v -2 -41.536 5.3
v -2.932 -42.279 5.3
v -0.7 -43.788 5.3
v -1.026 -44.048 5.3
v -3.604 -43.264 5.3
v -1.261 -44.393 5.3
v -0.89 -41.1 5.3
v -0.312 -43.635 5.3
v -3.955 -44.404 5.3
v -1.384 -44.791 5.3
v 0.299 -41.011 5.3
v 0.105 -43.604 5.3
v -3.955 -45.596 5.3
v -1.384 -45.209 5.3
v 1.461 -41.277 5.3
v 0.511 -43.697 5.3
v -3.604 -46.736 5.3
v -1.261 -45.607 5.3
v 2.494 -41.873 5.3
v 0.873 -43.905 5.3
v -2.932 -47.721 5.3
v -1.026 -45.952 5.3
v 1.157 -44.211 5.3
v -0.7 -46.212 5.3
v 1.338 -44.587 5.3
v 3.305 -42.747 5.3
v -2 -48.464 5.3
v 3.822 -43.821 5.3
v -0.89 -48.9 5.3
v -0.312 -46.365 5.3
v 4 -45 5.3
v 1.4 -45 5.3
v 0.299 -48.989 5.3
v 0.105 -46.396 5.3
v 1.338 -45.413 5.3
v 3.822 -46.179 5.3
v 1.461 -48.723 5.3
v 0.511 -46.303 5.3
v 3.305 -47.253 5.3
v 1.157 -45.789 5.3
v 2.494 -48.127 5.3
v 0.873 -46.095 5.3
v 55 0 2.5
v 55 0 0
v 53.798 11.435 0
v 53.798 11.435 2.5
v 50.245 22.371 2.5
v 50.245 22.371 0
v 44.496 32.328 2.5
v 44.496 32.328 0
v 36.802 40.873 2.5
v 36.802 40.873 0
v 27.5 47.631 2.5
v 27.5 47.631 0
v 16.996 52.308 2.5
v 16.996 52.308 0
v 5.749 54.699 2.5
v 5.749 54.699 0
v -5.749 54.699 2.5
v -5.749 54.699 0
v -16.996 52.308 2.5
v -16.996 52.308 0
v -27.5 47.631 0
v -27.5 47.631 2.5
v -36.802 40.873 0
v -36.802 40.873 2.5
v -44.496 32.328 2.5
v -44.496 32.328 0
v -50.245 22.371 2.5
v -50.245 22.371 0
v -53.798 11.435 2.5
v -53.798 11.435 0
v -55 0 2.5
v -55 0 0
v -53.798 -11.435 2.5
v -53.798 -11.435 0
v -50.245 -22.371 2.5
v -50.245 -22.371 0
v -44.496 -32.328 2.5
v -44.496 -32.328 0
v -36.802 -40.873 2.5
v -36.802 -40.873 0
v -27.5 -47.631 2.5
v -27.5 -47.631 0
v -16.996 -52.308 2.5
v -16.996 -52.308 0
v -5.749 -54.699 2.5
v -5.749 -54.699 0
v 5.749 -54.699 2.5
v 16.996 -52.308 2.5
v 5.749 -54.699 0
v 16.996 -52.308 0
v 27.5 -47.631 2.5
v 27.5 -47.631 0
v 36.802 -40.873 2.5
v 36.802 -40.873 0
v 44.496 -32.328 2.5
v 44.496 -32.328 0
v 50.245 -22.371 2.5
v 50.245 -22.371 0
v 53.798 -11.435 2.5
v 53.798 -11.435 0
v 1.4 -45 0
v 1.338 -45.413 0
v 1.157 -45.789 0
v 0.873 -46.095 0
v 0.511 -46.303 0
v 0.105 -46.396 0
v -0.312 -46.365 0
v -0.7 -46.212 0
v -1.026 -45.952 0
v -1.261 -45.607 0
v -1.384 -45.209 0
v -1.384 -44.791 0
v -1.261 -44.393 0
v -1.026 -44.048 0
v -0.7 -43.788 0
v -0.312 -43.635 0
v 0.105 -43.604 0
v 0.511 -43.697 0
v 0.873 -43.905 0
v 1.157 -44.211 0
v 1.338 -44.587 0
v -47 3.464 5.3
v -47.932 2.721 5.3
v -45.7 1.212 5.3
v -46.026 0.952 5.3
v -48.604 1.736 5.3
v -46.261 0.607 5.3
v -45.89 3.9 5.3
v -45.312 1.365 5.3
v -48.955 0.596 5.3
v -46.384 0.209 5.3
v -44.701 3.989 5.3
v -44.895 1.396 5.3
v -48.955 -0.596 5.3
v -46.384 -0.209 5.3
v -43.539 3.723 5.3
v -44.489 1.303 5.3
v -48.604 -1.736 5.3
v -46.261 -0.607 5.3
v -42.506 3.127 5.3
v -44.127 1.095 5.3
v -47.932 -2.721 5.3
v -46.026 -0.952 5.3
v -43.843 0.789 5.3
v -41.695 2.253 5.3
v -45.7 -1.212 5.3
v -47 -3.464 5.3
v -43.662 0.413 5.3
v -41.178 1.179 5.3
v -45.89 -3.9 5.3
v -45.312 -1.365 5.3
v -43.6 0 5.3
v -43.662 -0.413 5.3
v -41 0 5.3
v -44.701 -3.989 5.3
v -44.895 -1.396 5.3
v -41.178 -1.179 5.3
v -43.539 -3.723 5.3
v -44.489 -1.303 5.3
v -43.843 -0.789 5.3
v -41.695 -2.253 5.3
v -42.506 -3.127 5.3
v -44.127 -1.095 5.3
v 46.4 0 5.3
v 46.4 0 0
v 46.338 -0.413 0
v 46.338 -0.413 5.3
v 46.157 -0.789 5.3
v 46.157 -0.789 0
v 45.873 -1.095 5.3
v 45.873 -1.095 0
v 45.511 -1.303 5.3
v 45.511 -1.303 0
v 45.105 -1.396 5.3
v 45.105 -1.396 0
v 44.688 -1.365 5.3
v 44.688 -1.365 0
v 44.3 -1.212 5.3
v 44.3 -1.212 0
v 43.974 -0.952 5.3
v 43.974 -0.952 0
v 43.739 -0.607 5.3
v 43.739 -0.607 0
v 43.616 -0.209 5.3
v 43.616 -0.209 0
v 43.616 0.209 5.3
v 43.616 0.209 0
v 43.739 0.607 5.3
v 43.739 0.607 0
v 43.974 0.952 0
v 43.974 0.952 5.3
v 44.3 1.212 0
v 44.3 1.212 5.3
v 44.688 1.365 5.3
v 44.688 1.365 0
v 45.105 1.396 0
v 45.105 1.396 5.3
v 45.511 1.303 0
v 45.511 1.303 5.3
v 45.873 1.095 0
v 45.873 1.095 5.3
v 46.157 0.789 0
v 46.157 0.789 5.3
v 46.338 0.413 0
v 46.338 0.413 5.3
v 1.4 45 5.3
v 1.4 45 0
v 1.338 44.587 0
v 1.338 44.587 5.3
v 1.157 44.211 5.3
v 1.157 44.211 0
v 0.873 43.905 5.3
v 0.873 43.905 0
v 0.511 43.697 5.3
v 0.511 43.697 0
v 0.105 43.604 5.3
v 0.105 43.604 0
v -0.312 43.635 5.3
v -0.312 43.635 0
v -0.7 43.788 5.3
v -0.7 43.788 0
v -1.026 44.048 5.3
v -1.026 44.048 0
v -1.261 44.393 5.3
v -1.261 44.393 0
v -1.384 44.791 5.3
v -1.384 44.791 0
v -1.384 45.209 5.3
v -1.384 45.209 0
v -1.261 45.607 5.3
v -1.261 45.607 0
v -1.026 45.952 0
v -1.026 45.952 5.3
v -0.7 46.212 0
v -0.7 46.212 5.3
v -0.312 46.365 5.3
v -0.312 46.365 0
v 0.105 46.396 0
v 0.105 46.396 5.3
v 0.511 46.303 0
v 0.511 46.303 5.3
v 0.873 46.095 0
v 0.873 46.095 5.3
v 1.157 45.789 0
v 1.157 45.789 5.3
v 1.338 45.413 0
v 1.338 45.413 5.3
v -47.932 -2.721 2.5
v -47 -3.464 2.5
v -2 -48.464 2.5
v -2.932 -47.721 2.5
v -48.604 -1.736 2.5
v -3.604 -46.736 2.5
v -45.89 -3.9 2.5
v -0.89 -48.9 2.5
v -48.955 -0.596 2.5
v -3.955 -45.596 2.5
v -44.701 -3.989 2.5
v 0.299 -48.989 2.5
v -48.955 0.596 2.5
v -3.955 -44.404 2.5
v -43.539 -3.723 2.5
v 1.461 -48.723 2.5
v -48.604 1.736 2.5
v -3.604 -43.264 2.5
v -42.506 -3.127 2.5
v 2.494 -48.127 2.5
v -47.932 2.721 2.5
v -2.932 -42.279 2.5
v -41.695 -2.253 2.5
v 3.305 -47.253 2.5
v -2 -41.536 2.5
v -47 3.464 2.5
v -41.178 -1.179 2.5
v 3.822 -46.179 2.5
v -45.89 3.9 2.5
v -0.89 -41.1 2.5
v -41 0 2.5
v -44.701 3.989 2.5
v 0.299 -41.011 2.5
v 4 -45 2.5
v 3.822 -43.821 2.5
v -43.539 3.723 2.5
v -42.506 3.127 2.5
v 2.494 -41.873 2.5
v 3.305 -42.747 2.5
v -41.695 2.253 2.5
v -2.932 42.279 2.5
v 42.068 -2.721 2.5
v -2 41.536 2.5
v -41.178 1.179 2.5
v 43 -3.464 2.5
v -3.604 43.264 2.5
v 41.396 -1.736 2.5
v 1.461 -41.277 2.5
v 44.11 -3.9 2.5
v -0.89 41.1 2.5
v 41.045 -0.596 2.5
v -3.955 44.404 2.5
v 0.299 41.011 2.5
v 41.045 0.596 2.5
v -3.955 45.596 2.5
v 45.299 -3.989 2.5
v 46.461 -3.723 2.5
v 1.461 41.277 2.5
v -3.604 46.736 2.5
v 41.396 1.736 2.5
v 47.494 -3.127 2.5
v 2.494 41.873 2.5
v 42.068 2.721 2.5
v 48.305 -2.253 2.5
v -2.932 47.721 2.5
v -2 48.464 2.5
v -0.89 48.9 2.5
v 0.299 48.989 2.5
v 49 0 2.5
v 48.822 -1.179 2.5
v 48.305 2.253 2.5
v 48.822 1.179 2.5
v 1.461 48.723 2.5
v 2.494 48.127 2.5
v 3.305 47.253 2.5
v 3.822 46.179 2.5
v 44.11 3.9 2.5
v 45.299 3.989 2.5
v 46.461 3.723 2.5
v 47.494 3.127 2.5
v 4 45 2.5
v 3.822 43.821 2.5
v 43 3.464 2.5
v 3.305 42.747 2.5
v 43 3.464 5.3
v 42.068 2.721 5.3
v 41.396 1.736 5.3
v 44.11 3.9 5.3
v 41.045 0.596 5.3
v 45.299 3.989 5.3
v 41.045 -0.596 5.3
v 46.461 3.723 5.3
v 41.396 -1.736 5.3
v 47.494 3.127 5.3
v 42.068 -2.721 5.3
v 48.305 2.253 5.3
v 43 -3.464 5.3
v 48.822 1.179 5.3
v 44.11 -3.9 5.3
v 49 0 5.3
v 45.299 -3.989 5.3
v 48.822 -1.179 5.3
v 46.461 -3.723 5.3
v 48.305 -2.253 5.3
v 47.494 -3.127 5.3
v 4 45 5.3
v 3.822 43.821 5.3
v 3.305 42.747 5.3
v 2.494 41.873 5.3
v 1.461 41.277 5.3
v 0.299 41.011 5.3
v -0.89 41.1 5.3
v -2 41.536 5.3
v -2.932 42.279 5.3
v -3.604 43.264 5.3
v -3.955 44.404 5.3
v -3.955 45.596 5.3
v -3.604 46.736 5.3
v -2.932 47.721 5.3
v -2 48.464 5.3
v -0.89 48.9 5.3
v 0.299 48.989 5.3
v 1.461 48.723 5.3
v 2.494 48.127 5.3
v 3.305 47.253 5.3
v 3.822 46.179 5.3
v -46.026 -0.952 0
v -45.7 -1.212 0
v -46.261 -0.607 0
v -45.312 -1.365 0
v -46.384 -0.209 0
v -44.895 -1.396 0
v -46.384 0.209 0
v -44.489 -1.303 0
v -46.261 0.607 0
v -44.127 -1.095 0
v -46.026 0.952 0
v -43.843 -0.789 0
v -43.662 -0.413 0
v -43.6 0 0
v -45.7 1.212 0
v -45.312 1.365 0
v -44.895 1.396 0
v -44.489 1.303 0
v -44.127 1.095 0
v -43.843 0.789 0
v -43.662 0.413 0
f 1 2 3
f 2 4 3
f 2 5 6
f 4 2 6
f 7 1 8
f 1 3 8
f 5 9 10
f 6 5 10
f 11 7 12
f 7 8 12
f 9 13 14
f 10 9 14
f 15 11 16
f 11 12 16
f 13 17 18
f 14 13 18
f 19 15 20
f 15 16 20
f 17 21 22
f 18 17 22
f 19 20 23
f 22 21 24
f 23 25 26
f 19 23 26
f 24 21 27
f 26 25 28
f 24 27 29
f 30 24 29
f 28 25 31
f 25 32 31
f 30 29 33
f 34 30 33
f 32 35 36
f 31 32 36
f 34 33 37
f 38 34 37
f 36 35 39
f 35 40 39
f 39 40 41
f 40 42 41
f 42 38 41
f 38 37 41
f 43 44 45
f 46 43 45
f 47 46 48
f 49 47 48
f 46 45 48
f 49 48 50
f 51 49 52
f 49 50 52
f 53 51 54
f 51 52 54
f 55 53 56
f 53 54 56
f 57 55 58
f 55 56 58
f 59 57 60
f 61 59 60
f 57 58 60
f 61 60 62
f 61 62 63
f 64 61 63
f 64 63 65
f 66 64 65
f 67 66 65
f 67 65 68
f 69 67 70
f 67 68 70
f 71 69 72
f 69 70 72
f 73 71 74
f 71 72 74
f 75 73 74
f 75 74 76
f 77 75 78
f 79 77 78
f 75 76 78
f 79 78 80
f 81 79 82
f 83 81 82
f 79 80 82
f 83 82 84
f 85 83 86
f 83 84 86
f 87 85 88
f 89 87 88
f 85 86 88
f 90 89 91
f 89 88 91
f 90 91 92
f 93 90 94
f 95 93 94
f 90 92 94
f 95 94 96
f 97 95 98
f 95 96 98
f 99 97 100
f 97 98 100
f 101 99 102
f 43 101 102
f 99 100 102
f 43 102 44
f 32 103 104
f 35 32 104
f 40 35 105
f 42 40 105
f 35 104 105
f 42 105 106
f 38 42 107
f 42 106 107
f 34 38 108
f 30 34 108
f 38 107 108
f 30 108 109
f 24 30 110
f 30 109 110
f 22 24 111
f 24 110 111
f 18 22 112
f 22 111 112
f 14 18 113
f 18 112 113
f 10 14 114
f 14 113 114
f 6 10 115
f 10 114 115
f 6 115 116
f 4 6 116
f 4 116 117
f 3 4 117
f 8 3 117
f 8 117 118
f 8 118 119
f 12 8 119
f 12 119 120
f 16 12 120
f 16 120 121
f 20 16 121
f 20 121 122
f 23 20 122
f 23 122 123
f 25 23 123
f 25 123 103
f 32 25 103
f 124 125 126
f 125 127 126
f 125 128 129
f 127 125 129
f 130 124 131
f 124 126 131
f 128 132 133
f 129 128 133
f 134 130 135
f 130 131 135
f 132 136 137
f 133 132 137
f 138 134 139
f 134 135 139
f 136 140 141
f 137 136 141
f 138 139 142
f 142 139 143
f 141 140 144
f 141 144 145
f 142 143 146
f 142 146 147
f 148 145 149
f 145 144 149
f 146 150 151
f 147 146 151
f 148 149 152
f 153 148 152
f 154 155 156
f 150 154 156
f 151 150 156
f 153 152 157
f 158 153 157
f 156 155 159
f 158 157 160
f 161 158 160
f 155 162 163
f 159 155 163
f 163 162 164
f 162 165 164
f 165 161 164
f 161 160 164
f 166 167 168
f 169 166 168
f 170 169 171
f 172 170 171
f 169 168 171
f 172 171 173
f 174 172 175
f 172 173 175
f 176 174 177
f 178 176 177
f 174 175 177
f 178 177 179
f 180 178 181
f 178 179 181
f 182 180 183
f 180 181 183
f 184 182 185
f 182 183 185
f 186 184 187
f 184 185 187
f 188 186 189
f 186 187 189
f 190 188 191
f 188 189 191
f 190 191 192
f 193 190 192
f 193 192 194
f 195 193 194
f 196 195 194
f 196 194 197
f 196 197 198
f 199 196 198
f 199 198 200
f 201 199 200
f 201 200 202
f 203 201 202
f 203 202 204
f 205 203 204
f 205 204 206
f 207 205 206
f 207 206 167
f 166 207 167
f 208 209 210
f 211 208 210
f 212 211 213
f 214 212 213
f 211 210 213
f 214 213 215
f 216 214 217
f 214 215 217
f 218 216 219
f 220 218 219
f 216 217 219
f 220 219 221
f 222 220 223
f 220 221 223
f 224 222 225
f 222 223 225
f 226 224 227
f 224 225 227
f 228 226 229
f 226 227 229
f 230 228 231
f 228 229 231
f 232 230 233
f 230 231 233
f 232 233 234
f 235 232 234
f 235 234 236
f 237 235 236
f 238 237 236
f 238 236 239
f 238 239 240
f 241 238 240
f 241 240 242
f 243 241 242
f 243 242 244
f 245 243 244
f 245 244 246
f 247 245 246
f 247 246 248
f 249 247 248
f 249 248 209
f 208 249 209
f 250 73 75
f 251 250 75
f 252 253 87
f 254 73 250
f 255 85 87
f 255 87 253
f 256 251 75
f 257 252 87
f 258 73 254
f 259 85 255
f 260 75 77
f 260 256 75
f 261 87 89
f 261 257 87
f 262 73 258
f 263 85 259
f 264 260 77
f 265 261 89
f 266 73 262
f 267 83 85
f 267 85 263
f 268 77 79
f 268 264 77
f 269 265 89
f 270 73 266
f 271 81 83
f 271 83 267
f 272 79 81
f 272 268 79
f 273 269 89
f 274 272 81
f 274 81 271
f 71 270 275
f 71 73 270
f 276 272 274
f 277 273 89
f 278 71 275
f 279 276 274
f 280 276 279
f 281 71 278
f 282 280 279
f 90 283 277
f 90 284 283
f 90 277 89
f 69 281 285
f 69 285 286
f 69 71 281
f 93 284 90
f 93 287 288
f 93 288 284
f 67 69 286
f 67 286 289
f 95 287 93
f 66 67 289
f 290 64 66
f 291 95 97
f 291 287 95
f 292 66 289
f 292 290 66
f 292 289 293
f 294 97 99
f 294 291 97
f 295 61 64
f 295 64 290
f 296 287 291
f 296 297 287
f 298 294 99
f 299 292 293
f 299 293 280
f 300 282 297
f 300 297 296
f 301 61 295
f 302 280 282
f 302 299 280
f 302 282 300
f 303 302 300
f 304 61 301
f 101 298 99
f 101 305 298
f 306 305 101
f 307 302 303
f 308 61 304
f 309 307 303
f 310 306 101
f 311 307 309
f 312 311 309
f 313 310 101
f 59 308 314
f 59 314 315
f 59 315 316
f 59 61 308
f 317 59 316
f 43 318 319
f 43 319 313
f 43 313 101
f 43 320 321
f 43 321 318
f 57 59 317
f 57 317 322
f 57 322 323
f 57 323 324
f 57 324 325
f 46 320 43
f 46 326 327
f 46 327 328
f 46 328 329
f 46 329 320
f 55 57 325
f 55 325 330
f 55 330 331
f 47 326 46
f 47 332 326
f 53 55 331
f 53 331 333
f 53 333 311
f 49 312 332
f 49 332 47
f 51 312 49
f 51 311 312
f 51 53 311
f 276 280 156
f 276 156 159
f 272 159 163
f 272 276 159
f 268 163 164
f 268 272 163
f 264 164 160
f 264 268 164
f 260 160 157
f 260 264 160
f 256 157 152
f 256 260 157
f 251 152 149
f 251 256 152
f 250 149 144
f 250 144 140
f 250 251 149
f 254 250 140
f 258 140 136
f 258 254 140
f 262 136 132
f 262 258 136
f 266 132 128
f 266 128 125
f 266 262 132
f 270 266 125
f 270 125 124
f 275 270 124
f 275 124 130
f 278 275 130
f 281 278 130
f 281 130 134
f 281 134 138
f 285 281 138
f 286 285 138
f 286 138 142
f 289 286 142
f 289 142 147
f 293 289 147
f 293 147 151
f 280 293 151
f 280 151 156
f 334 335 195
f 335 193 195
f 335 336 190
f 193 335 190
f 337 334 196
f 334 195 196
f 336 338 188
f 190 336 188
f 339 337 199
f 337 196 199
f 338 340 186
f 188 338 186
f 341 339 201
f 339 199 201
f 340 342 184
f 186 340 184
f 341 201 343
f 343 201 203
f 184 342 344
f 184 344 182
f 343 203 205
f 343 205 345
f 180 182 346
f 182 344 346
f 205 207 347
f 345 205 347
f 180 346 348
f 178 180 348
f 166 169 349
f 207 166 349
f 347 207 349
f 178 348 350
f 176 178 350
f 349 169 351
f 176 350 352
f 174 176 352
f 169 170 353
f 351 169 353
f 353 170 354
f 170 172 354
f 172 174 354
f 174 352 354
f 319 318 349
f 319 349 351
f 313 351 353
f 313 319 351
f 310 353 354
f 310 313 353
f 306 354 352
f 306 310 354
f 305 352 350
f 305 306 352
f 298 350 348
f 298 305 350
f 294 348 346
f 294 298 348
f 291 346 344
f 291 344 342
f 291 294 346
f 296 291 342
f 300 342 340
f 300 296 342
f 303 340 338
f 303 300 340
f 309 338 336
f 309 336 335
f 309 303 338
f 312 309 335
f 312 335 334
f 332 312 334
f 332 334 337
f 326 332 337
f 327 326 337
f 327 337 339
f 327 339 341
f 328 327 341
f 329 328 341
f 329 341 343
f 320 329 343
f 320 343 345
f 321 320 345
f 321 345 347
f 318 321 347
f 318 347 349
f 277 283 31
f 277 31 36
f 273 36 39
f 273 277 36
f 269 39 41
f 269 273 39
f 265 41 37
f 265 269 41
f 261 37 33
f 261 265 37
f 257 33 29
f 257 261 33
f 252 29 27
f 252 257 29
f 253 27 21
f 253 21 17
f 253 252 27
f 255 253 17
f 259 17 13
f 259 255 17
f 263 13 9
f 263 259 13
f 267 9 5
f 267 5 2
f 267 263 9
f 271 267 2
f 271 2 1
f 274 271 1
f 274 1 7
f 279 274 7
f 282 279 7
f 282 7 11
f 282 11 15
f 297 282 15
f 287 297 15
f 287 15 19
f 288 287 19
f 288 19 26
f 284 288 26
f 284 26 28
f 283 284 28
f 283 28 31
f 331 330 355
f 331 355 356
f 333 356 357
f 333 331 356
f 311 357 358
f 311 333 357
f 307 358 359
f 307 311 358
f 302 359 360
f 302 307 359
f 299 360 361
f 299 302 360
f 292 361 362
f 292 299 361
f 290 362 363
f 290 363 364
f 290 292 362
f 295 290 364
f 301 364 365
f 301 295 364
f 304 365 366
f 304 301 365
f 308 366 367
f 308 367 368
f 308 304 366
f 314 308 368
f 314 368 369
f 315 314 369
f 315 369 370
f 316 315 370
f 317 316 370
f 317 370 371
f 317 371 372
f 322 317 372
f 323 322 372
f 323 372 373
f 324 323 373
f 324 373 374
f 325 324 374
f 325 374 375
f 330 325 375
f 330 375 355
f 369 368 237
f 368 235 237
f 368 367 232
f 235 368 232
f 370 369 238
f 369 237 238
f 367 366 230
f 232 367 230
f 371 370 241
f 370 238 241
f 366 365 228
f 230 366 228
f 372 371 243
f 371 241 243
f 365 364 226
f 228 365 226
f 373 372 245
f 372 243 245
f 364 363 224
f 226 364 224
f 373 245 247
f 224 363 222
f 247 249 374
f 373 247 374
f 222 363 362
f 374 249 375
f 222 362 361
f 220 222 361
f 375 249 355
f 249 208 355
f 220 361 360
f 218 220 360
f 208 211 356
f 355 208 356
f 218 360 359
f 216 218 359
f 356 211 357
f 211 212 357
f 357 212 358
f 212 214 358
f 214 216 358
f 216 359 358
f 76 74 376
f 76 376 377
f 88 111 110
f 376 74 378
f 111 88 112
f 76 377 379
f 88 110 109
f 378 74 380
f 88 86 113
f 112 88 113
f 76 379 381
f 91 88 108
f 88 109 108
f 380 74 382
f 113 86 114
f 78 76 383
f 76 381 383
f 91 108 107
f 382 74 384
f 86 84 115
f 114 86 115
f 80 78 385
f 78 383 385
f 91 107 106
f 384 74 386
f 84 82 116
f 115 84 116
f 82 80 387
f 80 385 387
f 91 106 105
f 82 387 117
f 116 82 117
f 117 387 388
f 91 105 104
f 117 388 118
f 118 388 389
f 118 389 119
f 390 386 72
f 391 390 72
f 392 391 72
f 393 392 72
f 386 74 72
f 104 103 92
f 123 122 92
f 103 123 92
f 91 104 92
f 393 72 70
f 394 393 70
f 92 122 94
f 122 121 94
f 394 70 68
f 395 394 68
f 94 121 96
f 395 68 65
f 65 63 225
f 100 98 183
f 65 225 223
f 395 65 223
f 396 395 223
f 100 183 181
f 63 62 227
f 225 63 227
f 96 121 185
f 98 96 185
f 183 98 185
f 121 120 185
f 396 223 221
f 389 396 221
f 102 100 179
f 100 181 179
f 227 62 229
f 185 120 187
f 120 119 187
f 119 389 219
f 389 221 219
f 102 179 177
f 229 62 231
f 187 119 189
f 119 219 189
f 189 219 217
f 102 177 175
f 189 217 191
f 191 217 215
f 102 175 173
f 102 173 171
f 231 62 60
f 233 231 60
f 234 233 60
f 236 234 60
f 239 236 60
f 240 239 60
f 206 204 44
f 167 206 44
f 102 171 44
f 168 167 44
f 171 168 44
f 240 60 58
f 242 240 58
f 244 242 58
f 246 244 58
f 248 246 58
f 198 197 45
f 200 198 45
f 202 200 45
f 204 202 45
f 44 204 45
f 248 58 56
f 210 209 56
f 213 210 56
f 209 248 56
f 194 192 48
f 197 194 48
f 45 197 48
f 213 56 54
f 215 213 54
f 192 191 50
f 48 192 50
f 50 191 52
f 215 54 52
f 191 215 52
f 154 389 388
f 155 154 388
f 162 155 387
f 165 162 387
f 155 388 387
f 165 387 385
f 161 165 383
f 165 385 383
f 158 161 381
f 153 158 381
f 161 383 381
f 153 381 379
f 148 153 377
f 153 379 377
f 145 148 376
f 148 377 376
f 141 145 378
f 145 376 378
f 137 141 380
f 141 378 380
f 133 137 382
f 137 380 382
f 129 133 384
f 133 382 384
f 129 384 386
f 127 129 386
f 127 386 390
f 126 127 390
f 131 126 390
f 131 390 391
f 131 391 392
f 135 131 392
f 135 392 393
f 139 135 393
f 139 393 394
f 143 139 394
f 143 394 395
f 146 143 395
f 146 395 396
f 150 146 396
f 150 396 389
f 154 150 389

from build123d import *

# Parameters (mm, degrees)
F0_R     = 55
F1_DEPTH = 2.5
F2_R     = 1.4
F3_DEPTH = 12.5
F2_R_2   = 4
F4_DEPTH = 5.3


with BuildPart() as f1:
    # F0 (on Top) → F1 (new body)
    with BuildSketch(Plane.XY):
        Circle(F0_R)
    extrude(amount=F1_DEPTH)

    # F2 (on face) → F3 (cut, symmetric)
    with BuildSketch(Plane(origin=(0, 0, 0), x_dir=(1, 0, 0), z_dir=(0, 0, -1))):
        with Locations((0, -45)):
            Circle(F2_R)
        with Locations((-45, 0)):
            Circle(F2_R)
        with Locations((0, 45)):
            Circle(F2_R)
        with Locations((45, 0)):
            Circle(F2_R)
    extrude(amount=F3_DEPTH, both=True, mode=Mode.SUBTRACT)

    # F2 (on face) → F4 (join)
    with BuildSketch(Plane(origin=(0, 0, 0), x_dir=(1, 0, 0), z_dir=(0, 0, -1))):
        with Locations((-45, 0)):
            Circle(F2_R_2)
        with Locations((-45, 0)):
            Circle(F2_R, mode=Mode.SUBTRACT)
        with Locations((0, -45)):
            Circle(F2_R_2)
        with Locations((0, -45)):
            Circle(F2_R, mode=Mode.SUBTRACT)
        with Locations((45, 0)):
            Circle(F2_R_2)
        with Locations((45, 0)):
            Circle(F2_R, mode=Mode.SUBTRACT)
        with Locations((0, 45)):
            Circle(F2_R_2)
        with Locations((0, 45)):
            Circle(F2_R, mode=Mode.SUBTRACT)
    extrude(amount=-F4_DEPTH)


solid = f1.part
